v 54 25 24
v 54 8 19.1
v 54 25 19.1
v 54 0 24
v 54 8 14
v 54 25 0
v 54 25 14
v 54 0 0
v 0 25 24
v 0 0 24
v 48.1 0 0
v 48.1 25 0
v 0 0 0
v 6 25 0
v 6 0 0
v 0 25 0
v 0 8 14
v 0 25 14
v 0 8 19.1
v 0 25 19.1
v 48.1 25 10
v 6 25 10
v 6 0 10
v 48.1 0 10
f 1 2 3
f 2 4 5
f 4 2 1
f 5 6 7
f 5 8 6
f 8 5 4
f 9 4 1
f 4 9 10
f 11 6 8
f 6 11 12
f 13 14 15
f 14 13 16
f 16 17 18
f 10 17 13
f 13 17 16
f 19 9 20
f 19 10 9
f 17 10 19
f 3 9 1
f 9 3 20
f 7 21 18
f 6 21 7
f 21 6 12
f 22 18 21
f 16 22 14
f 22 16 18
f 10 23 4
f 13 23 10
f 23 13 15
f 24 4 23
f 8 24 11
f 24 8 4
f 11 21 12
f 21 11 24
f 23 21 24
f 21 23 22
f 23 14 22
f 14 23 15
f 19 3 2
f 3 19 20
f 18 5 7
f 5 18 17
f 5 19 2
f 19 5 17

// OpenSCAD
extra = 0.1;
union()
{
	difference()
	{
		cube(size=[42+12,25,24]);
	#	translate([6,0,0])cube(size=[42+extra,25,10]);
		translate([0,8,14])cube([42+12,20,5+extra]);
	}
}
